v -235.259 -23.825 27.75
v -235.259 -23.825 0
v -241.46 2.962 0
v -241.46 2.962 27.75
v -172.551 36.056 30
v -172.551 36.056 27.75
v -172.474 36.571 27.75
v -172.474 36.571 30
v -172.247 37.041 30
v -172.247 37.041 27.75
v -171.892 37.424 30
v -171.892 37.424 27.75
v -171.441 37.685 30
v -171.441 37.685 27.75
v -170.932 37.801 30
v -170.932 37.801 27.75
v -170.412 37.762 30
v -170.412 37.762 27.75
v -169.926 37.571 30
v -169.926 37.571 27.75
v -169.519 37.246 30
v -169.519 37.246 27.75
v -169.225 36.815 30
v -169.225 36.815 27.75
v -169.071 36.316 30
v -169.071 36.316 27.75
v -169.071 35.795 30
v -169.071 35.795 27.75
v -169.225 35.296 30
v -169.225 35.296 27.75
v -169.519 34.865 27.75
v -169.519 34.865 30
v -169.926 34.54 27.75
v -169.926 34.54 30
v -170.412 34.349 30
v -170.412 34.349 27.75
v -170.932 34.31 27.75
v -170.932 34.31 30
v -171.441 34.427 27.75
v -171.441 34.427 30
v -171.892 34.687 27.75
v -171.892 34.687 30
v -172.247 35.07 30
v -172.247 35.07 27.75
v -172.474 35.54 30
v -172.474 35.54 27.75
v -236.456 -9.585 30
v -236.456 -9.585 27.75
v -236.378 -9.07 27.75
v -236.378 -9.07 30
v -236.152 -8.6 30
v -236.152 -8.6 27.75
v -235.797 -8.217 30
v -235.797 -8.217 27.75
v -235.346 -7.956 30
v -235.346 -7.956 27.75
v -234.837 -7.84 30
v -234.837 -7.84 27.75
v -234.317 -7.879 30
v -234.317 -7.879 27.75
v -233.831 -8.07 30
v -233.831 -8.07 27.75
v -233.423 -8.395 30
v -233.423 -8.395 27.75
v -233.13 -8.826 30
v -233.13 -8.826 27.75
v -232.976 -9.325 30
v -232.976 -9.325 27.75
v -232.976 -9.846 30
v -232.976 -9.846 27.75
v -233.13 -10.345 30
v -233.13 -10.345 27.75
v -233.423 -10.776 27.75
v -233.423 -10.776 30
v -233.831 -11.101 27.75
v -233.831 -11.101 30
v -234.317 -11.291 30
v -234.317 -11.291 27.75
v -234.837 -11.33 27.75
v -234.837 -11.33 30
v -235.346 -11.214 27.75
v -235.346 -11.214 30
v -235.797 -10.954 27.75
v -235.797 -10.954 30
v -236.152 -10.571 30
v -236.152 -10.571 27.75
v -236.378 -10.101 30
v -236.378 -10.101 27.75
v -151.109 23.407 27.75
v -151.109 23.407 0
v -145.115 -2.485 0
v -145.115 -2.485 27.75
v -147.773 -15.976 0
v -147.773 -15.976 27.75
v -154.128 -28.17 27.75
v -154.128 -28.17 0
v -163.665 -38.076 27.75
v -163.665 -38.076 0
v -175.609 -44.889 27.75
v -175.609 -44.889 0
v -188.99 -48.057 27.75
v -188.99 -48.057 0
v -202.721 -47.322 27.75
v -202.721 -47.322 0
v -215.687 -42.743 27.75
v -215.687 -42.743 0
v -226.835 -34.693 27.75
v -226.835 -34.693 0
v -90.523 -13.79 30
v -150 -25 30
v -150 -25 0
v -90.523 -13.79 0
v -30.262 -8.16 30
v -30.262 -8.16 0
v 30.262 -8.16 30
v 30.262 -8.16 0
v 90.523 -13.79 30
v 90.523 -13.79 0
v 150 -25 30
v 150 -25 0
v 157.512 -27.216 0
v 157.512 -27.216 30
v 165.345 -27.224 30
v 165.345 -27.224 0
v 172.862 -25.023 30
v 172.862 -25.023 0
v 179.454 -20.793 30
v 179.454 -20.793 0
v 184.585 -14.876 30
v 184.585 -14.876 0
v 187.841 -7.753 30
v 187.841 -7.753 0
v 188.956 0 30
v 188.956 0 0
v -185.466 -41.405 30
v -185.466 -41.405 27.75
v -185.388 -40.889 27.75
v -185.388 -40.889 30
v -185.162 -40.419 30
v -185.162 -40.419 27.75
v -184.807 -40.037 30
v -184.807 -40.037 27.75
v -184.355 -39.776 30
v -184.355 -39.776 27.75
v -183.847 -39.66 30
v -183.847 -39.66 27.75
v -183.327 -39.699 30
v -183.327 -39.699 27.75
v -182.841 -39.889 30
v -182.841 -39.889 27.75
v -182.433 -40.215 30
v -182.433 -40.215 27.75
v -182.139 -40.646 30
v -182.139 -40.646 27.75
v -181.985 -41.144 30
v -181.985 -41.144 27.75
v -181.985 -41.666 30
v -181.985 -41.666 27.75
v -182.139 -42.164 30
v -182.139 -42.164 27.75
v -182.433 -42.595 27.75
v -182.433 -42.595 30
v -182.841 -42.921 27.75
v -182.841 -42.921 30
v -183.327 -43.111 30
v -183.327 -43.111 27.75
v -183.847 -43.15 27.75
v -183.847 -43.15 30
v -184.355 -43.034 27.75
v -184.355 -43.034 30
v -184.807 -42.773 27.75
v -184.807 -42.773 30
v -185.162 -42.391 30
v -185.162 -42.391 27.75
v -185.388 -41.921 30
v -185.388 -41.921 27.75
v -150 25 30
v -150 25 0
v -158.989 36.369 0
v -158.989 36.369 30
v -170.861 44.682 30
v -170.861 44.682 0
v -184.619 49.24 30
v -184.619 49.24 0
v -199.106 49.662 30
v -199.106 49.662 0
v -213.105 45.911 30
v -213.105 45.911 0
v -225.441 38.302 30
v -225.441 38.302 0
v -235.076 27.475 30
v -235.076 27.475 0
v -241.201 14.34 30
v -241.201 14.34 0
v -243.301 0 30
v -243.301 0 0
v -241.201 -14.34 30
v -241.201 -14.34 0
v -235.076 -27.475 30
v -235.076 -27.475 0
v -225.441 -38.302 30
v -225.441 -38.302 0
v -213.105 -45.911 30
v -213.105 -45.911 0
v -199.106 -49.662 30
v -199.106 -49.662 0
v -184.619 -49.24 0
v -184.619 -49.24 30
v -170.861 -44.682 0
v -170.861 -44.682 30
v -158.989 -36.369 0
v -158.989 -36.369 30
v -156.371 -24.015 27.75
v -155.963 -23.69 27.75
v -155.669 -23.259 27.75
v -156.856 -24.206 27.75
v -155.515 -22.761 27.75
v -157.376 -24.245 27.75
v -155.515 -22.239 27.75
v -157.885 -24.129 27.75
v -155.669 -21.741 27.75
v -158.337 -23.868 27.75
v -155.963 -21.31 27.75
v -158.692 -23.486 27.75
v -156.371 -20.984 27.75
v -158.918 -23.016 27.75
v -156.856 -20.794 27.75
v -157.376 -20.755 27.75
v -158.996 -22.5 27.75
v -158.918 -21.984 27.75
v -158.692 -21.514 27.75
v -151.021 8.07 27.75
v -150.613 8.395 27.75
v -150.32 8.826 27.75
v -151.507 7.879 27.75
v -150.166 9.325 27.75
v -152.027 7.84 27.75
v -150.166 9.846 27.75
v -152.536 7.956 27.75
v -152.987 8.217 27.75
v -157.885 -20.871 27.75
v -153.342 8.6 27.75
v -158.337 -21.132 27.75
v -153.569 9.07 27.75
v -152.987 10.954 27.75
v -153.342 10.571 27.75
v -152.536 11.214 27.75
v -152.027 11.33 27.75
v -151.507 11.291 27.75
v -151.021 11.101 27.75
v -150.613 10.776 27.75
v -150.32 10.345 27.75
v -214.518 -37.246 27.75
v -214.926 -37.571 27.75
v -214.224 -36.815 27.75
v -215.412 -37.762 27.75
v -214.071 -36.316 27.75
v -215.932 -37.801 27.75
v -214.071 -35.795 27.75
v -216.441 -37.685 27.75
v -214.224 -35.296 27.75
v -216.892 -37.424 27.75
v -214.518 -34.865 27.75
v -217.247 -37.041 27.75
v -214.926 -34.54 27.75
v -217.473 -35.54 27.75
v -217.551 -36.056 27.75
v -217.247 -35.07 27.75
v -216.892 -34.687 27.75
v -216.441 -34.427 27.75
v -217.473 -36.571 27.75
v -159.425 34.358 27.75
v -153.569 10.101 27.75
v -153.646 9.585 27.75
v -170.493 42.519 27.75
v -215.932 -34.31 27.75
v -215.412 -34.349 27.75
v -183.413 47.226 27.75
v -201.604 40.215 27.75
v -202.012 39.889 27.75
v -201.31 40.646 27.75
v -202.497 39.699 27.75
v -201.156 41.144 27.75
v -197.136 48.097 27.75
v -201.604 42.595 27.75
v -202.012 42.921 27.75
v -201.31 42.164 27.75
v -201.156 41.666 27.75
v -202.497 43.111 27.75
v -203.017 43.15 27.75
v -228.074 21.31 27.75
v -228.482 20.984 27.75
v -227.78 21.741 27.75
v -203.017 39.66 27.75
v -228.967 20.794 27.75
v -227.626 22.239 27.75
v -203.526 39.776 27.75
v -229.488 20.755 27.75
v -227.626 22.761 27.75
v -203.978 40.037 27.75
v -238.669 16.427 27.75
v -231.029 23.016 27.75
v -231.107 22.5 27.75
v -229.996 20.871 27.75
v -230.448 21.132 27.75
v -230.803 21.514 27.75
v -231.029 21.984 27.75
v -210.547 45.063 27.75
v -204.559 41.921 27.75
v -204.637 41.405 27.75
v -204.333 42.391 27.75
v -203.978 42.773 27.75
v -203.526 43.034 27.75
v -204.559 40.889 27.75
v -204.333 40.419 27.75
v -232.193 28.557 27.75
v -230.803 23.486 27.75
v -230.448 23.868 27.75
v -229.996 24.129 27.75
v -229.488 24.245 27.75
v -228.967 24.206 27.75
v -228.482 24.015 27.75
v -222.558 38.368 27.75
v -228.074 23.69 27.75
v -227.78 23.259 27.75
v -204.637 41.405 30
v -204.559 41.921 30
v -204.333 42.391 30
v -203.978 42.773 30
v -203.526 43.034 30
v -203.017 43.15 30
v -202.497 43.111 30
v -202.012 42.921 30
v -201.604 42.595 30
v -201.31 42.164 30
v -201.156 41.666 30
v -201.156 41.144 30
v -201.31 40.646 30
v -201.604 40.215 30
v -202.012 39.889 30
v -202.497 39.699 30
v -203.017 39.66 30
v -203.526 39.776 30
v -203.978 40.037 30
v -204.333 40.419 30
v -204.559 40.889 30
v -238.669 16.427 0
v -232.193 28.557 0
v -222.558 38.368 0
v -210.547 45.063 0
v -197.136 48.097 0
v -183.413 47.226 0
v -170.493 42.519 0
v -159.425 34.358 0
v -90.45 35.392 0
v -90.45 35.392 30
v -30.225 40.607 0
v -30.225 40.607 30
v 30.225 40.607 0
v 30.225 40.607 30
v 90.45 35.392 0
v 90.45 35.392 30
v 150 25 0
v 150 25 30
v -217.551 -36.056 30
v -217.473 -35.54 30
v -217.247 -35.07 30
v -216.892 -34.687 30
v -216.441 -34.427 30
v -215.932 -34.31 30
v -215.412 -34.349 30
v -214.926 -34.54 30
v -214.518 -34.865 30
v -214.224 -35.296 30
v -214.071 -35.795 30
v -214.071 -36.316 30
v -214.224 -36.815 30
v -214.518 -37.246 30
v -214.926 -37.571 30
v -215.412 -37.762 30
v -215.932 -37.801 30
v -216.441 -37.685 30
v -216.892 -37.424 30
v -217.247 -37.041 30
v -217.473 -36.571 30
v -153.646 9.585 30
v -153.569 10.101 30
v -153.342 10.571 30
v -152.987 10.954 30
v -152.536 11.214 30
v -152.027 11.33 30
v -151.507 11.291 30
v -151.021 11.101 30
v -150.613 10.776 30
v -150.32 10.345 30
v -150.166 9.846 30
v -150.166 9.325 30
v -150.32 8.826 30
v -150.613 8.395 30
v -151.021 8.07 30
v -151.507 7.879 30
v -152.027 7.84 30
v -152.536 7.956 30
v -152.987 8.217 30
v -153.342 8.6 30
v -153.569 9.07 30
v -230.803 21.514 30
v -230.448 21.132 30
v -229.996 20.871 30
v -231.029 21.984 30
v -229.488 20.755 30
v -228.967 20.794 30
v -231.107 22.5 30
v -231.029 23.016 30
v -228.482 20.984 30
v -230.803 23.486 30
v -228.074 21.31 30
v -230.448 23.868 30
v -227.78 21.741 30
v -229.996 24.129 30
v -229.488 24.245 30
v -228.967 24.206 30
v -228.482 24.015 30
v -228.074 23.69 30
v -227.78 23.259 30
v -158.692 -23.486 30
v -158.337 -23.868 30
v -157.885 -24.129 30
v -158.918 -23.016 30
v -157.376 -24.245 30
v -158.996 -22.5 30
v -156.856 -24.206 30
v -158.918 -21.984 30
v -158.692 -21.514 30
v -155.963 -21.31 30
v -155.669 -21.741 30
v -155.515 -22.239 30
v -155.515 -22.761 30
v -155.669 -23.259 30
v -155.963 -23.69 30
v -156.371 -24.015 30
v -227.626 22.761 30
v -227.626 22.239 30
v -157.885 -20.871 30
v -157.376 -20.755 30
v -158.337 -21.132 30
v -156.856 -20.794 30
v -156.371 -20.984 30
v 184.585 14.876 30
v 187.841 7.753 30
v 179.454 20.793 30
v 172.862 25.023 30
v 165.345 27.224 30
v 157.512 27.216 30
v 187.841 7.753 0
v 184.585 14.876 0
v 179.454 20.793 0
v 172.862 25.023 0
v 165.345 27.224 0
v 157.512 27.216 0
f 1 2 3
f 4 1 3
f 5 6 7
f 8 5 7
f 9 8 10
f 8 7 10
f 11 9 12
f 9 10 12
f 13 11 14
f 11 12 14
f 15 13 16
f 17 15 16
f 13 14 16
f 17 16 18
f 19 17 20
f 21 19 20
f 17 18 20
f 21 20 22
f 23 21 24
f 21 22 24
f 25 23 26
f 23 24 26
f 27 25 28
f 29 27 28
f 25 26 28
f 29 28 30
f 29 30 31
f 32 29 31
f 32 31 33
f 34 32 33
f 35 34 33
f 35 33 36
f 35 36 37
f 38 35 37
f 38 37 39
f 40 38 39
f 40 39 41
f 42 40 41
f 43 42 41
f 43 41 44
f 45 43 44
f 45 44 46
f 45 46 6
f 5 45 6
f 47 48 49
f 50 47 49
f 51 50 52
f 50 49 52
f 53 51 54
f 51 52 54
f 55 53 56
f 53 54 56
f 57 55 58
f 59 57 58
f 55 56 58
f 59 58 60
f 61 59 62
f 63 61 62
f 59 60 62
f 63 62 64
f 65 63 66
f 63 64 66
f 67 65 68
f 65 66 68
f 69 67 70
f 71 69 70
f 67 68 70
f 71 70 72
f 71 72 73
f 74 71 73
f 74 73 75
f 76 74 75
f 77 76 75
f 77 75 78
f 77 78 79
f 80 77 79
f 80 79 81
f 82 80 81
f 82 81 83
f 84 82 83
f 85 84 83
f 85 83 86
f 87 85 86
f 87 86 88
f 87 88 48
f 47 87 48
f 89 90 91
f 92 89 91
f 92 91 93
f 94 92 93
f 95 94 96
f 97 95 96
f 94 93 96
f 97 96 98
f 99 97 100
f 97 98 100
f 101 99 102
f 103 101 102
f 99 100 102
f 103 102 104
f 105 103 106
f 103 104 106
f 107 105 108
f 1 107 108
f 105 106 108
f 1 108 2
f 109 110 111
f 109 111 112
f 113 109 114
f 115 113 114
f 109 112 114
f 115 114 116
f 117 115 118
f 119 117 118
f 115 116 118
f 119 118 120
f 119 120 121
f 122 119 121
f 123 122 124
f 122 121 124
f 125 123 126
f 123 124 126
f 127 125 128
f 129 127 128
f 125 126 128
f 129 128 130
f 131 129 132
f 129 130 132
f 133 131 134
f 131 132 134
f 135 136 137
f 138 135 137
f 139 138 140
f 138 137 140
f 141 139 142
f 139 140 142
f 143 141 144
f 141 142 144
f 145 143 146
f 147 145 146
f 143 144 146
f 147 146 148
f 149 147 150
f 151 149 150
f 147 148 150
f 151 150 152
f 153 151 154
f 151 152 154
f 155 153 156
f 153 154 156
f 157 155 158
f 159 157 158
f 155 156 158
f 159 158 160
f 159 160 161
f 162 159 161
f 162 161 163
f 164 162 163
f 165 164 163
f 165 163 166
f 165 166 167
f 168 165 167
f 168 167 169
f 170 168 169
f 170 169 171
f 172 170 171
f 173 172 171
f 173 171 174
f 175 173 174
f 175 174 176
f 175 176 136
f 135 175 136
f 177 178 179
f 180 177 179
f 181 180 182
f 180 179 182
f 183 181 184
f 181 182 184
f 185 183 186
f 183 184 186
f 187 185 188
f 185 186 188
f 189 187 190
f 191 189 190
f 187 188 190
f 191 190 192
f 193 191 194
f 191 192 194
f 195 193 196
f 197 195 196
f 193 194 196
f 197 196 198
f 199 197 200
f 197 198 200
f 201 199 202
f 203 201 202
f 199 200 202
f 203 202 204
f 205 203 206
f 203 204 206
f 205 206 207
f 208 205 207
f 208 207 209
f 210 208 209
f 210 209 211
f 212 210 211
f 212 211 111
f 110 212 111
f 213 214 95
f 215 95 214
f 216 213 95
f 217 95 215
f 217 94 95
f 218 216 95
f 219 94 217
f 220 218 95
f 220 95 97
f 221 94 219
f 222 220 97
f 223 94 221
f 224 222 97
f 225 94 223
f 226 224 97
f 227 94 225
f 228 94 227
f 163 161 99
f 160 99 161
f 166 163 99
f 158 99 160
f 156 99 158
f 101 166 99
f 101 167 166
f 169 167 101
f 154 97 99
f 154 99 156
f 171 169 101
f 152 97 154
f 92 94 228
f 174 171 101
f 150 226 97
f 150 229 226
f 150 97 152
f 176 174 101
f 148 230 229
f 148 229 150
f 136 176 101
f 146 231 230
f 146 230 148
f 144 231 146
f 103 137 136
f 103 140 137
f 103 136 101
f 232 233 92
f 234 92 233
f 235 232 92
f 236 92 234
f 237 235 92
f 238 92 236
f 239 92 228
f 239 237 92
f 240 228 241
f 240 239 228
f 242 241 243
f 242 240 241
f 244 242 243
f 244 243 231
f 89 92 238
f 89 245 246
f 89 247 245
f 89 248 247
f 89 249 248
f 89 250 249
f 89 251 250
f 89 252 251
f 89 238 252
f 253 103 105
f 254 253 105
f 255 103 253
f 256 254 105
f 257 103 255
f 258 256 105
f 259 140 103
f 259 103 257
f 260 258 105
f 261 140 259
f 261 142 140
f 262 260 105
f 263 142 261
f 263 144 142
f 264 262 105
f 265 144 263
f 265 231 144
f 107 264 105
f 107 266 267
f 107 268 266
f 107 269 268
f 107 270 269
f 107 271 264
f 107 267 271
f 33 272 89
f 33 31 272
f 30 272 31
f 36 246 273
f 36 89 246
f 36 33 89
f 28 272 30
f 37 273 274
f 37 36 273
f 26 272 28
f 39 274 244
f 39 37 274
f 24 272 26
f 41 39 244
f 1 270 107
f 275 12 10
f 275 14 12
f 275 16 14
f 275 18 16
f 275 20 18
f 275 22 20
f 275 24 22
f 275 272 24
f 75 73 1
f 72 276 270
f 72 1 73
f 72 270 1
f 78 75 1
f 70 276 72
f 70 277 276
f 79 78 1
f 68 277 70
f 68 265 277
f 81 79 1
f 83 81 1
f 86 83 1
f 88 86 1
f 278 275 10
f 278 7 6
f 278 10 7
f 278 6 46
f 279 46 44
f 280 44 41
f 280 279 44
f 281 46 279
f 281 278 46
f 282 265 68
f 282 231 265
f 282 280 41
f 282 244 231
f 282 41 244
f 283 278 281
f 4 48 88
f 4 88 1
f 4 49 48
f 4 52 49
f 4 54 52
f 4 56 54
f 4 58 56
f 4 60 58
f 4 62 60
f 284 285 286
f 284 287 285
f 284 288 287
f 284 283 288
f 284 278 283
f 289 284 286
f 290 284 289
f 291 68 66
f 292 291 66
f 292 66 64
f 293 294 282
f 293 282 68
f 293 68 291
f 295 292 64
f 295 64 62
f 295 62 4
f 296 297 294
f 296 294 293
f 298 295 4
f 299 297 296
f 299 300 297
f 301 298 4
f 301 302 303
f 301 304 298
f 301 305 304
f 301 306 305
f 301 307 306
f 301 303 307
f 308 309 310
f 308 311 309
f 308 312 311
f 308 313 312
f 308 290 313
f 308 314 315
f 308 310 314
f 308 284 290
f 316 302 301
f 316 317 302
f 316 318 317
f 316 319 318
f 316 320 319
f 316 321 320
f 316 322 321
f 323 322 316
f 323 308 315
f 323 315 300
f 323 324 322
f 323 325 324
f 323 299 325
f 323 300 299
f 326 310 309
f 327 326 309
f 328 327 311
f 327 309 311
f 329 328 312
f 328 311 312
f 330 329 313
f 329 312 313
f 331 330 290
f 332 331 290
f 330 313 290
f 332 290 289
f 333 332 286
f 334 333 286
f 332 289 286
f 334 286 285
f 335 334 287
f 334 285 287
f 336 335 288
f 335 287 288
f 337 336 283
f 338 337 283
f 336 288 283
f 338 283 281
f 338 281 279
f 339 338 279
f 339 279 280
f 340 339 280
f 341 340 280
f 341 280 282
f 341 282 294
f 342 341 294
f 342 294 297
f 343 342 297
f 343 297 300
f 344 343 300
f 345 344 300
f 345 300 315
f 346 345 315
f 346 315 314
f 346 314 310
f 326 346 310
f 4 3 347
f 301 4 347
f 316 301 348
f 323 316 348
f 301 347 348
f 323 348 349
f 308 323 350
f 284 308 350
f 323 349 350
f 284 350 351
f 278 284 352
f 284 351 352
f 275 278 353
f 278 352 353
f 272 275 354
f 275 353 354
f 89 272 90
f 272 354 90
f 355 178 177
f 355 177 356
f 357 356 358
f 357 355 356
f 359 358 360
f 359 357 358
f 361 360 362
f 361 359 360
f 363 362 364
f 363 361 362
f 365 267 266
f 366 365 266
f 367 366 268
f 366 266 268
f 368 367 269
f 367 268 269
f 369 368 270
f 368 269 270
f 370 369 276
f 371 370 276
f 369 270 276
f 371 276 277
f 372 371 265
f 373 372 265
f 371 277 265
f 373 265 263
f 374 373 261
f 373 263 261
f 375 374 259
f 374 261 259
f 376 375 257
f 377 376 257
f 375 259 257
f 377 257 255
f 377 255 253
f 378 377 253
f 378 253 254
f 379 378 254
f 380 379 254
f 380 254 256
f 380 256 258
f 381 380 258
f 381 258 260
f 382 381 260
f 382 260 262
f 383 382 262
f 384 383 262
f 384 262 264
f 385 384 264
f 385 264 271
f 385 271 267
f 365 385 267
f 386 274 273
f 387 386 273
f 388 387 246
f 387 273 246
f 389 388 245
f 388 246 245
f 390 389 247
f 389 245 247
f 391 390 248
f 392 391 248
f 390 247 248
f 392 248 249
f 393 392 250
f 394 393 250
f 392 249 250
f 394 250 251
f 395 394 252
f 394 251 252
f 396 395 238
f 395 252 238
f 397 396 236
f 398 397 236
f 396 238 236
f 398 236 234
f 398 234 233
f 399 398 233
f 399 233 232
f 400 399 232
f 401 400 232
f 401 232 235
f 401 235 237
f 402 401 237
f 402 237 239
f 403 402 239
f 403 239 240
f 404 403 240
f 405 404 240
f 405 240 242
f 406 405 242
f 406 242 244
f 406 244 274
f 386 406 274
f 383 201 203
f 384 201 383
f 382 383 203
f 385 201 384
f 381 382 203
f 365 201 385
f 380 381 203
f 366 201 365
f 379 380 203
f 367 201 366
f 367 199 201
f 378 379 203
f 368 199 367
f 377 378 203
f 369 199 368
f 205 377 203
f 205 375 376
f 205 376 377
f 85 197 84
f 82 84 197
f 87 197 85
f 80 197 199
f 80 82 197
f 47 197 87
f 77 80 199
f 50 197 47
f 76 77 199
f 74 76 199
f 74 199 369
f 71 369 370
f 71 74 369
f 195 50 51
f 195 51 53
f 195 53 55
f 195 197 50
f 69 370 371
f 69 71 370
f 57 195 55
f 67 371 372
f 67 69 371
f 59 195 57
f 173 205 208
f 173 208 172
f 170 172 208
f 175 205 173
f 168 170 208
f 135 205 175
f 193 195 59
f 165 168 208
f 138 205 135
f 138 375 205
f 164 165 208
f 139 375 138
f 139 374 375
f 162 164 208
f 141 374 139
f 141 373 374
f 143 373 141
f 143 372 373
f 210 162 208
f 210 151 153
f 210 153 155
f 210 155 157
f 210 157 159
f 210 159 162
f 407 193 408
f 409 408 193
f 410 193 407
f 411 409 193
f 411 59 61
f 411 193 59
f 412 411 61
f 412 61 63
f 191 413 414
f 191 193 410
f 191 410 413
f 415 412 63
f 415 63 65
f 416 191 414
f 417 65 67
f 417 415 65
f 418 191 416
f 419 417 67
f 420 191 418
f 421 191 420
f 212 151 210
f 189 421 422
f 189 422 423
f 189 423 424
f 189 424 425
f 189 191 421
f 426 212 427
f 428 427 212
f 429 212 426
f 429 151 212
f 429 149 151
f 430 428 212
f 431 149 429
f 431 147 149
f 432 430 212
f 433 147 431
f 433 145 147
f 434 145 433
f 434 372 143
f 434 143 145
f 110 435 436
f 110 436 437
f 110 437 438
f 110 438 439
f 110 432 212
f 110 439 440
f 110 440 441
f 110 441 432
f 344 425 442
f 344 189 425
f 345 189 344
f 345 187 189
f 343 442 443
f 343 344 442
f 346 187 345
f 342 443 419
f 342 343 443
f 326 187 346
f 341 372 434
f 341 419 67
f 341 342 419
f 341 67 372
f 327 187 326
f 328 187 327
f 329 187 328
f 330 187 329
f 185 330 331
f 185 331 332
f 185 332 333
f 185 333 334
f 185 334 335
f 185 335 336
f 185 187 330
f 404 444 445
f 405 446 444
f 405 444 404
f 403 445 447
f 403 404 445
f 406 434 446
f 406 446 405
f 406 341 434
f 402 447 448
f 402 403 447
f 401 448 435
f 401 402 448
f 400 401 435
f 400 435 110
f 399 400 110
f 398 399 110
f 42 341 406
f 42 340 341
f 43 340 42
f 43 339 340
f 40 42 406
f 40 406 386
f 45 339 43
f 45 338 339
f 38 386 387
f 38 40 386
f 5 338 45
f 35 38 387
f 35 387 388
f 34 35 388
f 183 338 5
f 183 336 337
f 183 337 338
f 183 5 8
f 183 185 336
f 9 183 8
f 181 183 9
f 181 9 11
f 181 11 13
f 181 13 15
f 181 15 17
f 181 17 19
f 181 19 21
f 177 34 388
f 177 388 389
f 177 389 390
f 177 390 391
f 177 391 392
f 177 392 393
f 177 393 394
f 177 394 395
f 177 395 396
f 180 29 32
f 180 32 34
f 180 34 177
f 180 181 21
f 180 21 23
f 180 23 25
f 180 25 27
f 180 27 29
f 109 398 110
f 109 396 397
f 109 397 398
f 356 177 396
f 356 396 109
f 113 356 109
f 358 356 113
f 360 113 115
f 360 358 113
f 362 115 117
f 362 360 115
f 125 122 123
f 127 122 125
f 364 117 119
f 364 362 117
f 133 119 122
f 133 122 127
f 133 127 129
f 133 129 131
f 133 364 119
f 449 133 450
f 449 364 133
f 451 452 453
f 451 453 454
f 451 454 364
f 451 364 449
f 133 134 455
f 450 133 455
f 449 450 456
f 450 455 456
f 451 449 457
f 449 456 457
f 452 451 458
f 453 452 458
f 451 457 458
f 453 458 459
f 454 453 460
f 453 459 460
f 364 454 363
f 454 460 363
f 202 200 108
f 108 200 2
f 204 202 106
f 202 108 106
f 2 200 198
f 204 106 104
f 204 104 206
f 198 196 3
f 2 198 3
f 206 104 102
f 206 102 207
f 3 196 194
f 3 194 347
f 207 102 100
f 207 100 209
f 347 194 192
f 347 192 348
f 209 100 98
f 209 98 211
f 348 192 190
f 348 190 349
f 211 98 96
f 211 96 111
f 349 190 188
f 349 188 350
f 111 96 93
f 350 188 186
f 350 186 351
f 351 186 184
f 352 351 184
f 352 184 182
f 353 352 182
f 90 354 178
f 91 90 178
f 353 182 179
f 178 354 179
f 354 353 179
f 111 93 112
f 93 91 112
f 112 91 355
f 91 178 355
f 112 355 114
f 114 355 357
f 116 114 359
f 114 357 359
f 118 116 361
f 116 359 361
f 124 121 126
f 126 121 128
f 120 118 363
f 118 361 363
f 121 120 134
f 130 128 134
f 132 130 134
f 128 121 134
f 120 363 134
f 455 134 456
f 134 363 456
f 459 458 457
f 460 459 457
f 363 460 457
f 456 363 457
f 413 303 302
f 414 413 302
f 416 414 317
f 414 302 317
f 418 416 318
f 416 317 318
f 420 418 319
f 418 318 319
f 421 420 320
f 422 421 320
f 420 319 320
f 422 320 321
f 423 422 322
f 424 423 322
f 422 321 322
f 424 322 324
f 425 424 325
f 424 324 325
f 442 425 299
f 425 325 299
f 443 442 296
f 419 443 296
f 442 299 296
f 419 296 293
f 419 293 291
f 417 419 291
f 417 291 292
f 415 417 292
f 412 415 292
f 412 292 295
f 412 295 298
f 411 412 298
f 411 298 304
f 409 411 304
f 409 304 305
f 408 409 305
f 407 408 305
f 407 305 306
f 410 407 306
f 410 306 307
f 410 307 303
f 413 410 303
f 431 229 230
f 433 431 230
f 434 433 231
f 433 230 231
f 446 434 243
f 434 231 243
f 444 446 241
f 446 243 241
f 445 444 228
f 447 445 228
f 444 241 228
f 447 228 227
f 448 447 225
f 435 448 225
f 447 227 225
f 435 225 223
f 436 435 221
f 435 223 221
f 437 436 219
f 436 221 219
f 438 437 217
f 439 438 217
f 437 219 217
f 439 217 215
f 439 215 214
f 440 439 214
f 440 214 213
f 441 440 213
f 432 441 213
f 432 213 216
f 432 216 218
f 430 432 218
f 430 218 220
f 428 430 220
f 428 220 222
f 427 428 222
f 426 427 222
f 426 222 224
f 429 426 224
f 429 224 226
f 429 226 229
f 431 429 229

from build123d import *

# Parameters (mm, degrees)
EXTRUDE_3_DEPTH     = 30
CUT_EXTRUDE_1_DEPTH = 27.75
SKETCH_5_R          = 1.75
CUT_EXTRUDE_2_DEPTH = 250.931131666


with BuildPart() as part:
    # 草图1 → 凸台-拉伸3 (new body)
    with BuildSketch(Plane.XY):
        with BuildLine():
            ThreePointArc((188.956439237, 0), (176.309013441, 23.14413618), (150, 25))
            Line((150, 25), (150, -25))
            ThreePointArc((150, -25), (176.309013441, -23.14413618), (188.956439237, 0))
        make_face()
        with BuildLine():
            Line((150, -25), (150, 25))
            ThreePointArc((150, 25), (133.956439237, 0), (150, -25))
        make_face()
        with BuildLine():
            ThreePointArc((188.956439237, 0), (176.309013441, 23.14413618), (150, 25))
            Line((150, 25), (150, -25))
            ThreePointArc((150, -25), (176.309013441, -23.14413618), (188.956439237, 0))
        make_face()
        with BuildLine():
            Line((150, -25), (150, 25))
            ThreePointArc((150, 25), (133.956439237, 0), (150, -25))
        make_face()
        with BuildLine():
            Line((150, 25), (-150, 25))
            ThreePointArc((-150, 25), (-145.004978875, 12.940952255), (-143.301270189, 0))
            ThreePointArc((-143.301270189, 0), (-145.004978875, -12.940952255), (-150, -25))
            ThreePointArc((-150, -25), (0, -7.455532034), (150, -25))
            ThreePointArc((150, -25), (133.956439237, 0), (150, 25))
        make_face()
        with BuildLine():
            ThreePointArc((-150, 25), (0, 41.260283441), (150, 25))
            Line((150, 25), (-150, 25))
        make_face()
        with BuildLine():
            ThreePointArc((-143.301270189, 0), (-145.004978875, 12.940952255), (-150, 25))
            Line((-150, 25), (-150, -25))
            ThreePointArc((-150, -25), (-145.004978875, -12.940952255), (-143.301270189, 0))
        make_face()
        with BuildLine():
            Line((-150, -25), (-150, 25))
            ThreePointArc((-150, 25), (-243.301270189, 0), (-150, -25))
        make_face()
        with BuildLine():
            ThreePointArc((-143.301270189, 0), (-145.004978875, 12.940952255), (-150, 25))
            Line((-150, 25), (-150, -25))
            ThreePointArc((-150, -25), (-145.004978875, -12.940952255), (-143.301270189, 0))
        make_face()
        with BuildLine():
            Line((-150, -25), (-150, 25))
            ThreePointArc((-150, 25), (-243.301270189, 0), (-150, -25))
        make_face()
    extrude(amount=EXTRUDE_3_DEPTH)

    # 草图3 → 切除-拉伸1 (cut)
    with BuildSketch(Plane(origin=(0, 0, 0), x_dir=(-1, 0, 0), z_dir=(0, 0, -1))):
        with BuildLine():
            ThreePointArc((241.460241998, 2.962420354), (203.950254971, 47.06019149), (151.10937756, 23.40740687))
            Line((151.10937756, 23.40740687), (145.115292459, -2.484763599))
            ThreePointArc((145.115292459, -2.484763599), (182.186192507, -46.952290127), (235.258997062, -23.8246019))
            Line((235.258997062, -23.8246019), (238.35961953, -10.431090773))
            Line((238.35961953, -10.431090773), (241.460241998, 2.962420354))
        make_face()
    extrude(amount=-CUT_EXTRUDE_1_DEPTH, mode=Mode.SUBTRACT)

    # 草图5 → 切除-拉伸2 (cut, through all)
    with BuildSketch(Plane(origin=(0, 0, 27.75), x_dir=(-1, 0, 0), z_dir=(0, 0, -1))):
        with Locations((151.896300525, 9.585326657)):
            Circle(SKETCH_5_R)
        with Locations((170.801384844, 36.055584303)):
            Circle(SKETCH_5_R)
        with Locations((202.886596846, 41.404969664)):
            Circle(SKETCH_5_R)
        with Locations((229.356854492, 22.499885346)):
            Circle(SKETCH_5_R)
        with Locations((234.706239853, -9.585326656)):
            Circle(SKETCH_5_R)
        with Locations((215.801155535, -36.055584303)):
            Circle(SKETCH_5_R)
        with Locations((183.715943533, -41.404969664)):
            Circle(SKETCH_5_R)
        with Locations((157.245685886, -22.499885346)):
            Circle(SKETCH_5_R)
    extrude(amount=-CUT_EXTRUDE_2_DEPTH, mode=Mode.SUBTRACT)


solid = part.part
